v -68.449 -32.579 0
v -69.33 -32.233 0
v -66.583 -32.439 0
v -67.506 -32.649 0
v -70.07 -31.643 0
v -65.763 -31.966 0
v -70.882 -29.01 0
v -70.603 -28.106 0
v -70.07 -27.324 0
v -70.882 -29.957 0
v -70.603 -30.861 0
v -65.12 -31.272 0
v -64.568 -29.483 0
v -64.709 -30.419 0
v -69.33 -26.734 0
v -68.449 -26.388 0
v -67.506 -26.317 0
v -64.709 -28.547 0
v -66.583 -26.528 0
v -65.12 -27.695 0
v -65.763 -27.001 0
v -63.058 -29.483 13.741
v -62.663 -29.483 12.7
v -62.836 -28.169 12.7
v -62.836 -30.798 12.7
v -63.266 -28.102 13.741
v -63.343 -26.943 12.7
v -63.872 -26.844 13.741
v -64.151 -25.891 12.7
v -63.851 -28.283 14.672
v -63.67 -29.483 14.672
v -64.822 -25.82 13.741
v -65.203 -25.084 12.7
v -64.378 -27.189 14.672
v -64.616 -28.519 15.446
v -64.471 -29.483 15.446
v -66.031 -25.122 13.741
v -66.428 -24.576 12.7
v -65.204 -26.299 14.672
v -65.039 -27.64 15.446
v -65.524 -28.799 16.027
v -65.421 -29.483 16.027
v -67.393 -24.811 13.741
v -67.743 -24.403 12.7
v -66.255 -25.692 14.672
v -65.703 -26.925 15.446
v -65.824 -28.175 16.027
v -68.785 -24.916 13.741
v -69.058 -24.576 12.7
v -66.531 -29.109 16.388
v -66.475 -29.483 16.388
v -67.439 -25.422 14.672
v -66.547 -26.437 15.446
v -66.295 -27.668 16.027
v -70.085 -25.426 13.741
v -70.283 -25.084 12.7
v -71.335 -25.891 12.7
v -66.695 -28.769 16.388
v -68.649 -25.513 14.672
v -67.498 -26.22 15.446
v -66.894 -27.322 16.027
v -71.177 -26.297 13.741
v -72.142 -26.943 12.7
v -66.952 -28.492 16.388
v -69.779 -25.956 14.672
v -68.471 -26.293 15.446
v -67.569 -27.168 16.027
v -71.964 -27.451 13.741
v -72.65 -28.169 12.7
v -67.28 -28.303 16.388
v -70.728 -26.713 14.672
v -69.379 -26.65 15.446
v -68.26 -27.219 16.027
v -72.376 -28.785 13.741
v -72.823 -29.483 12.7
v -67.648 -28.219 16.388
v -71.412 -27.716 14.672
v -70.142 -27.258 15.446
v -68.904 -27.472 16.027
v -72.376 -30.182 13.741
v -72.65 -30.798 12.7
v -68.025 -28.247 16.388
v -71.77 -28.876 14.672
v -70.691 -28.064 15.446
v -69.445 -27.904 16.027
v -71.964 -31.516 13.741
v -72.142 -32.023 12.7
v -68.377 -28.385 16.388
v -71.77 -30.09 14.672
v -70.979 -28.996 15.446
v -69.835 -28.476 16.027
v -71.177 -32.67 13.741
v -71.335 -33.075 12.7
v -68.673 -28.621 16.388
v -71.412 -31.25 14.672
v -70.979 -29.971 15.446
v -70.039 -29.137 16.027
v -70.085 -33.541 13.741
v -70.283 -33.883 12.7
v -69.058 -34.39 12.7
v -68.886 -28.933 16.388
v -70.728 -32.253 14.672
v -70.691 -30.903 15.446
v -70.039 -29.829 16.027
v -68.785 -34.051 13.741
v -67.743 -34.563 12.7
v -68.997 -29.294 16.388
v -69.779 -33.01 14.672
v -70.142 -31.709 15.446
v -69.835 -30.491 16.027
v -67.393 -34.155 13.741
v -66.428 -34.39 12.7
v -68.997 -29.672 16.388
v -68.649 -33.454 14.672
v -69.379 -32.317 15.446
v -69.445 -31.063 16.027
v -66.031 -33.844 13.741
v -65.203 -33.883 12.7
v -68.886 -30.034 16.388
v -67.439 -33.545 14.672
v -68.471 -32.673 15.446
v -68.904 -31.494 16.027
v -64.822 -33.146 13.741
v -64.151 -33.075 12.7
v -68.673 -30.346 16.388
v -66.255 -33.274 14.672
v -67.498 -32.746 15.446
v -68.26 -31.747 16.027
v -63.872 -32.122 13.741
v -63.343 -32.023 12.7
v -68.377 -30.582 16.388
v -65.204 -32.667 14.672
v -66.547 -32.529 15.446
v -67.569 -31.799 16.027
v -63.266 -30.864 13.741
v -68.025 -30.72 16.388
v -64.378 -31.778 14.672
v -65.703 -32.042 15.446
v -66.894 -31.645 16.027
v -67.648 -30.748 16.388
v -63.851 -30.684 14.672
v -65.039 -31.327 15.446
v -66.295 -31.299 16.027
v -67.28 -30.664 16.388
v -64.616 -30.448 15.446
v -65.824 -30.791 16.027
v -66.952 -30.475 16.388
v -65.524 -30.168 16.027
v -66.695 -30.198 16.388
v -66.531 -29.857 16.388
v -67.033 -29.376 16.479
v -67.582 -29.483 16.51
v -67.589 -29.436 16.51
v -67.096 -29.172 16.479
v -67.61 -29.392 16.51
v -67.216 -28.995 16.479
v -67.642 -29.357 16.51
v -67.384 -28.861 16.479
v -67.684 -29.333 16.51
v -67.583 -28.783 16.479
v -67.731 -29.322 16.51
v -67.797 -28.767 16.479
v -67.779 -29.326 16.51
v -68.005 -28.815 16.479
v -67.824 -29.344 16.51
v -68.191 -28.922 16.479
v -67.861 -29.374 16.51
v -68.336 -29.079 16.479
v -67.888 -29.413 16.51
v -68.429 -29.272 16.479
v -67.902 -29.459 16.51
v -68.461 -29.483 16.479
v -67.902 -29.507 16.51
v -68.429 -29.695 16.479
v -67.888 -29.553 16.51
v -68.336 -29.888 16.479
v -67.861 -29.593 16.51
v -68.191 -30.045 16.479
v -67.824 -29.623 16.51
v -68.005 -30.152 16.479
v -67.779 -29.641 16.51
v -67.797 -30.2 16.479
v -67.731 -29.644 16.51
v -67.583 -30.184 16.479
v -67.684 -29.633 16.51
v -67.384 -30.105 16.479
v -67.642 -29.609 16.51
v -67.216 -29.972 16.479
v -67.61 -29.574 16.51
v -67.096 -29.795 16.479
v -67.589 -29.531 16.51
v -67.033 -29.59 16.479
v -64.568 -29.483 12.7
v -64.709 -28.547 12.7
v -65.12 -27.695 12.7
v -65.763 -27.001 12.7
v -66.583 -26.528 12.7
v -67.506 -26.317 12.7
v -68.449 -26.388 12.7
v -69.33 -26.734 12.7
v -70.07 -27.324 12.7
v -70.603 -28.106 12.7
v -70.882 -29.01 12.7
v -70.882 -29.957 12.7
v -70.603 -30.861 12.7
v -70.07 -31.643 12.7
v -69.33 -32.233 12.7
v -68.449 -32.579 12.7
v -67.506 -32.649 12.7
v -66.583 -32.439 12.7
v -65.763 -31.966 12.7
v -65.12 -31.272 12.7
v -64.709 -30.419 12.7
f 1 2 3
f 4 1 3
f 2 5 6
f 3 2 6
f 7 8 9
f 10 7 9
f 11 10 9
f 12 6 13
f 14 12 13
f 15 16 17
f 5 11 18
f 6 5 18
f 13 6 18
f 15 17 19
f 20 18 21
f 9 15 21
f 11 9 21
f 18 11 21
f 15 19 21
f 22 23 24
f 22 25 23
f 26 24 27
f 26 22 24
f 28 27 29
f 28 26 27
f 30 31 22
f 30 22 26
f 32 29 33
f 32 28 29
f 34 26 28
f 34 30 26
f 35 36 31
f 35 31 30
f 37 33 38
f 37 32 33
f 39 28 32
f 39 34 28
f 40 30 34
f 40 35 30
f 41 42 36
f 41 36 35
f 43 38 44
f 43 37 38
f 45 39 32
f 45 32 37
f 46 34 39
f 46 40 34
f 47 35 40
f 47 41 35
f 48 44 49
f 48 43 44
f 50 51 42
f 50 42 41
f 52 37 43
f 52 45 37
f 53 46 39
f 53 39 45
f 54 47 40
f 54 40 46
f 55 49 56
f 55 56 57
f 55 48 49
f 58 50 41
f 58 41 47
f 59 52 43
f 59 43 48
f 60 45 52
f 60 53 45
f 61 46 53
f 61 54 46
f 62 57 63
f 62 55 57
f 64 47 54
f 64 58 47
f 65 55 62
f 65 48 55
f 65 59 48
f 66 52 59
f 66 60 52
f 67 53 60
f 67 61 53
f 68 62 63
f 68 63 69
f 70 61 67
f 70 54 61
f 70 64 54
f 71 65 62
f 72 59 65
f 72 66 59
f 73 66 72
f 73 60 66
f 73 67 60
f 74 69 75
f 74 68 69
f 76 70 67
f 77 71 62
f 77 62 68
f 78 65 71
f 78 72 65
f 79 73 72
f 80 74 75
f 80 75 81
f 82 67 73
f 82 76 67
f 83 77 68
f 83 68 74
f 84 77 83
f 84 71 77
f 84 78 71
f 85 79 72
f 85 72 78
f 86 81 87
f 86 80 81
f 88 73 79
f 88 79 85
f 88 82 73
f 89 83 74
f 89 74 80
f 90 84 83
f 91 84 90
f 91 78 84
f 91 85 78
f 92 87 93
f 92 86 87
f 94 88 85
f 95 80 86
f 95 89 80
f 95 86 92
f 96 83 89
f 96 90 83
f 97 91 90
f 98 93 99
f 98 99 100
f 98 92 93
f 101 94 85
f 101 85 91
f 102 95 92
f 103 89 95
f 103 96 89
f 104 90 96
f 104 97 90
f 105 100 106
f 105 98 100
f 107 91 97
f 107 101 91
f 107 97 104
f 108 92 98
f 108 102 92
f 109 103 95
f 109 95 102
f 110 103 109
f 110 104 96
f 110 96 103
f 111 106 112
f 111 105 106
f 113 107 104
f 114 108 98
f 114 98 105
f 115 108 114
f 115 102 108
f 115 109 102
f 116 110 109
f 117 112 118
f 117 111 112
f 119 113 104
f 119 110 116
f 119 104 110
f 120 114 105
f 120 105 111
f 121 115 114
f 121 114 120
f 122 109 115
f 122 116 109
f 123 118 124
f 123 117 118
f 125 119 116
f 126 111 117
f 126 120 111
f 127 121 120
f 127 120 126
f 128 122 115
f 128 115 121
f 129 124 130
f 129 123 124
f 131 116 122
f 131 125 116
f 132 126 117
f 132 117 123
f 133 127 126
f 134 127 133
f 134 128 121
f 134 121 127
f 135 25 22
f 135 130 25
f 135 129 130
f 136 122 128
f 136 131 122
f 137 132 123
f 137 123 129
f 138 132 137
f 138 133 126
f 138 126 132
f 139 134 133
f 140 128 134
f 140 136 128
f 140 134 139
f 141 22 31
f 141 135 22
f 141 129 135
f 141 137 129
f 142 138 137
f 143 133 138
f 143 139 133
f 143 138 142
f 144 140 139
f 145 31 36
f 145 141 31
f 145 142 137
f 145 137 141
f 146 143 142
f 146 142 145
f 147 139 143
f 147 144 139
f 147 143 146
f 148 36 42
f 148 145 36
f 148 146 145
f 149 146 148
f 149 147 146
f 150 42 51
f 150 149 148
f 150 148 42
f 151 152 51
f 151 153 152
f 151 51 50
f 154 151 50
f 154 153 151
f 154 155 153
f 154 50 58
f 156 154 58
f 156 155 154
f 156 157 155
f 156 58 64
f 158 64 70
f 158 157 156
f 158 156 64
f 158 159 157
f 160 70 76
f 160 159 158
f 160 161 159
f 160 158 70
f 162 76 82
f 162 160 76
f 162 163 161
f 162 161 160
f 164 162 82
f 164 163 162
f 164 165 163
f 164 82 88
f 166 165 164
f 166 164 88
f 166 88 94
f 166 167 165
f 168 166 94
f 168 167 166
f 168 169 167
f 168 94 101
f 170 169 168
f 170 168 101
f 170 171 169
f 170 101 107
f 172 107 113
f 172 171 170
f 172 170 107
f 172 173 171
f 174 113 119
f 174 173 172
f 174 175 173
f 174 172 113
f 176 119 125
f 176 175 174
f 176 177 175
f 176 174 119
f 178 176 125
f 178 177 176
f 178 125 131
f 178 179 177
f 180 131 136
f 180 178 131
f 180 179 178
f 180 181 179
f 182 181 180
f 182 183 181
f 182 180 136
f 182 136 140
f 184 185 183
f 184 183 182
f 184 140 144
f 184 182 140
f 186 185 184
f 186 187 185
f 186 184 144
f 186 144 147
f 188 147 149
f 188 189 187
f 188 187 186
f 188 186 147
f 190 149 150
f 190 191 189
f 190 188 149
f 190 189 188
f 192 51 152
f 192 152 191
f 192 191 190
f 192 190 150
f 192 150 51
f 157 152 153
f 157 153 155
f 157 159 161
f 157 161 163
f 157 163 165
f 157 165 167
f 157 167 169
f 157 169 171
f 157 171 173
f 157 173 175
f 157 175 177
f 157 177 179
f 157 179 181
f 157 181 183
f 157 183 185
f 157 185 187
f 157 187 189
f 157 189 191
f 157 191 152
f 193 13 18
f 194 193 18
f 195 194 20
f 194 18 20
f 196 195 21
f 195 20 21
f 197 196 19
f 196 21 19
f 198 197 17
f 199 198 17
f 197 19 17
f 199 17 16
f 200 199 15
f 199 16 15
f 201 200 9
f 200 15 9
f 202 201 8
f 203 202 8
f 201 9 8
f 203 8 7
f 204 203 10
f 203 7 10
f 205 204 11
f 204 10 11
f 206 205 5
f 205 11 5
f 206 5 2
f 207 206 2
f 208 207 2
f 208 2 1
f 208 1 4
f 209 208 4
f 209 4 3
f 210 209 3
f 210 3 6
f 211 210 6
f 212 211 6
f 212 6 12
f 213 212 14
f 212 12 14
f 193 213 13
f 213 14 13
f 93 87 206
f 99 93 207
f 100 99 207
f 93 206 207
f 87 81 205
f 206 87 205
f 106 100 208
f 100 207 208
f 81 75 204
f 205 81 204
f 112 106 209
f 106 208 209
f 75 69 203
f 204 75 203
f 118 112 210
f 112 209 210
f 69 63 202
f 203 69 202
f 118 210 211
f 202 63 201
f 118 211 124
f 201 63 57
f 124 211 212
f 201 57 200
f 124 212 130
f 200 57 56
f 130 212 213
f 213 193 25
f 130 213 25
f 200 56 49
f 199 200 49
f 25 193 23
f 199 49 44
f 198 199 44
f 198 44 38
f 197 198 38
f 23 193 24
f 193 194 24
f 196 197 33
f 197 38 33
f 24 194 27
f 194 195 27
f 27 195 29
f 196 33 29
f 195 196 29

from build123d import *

# Parameters (mm, degrees)
F0_R     = 3.175
F1_DEPTH = 12.7
F2_R     = 5.08
F3_DEPTH = 3.81


# Not quite as in the source:
# - a fillet or chamfer that OpenCascade refuses, or shapes differently, is made with other operations: its cross-section is extruded or revolved along the edge and cut away or added


with BuildPart() as f1:
    # F0 (on Top) → F1 (new body)
    with BuildSketch(Plane.XY):
        with Locations((-67.7428916097, -29.48333323)):
            Circle(F0_R)
    extrude(amount=F1_DEPTH)

    # F2 (on face) → F3 (join)
    with BuildSketch(Plane.XY.offset(12.7)):
        with Locations((-67.7428916097, -29.48333323)):
            Circle(F2_R)
    extrude(amount=F3_DEPTH)

    # F4: fillet of radius 5.08 on 1 edges, made by hand

    # F4_s1 → F4_t2 (revolve, cut)
    with BuildSketch(Plane.XZ.offset(29.48333323)):
        with BuildLine():
            ThreePointArc((-62.6628916097, 12.7), (-64.470728486, 15.4460926284), (-67.5815804594, 16.51))
            Line((-67.5815804594, 16.51), (-62.6628916097, 16.51))
            Line((-62.6628916097, 16.51), (-62.6628916097, 12.7))
        make_face()
    revolve(axis=Axis((-67.7428916097, -29.48333323, 16.51), (0, 0, 1)), mode=Mode.SUBTRACT)


solid = f1.part
